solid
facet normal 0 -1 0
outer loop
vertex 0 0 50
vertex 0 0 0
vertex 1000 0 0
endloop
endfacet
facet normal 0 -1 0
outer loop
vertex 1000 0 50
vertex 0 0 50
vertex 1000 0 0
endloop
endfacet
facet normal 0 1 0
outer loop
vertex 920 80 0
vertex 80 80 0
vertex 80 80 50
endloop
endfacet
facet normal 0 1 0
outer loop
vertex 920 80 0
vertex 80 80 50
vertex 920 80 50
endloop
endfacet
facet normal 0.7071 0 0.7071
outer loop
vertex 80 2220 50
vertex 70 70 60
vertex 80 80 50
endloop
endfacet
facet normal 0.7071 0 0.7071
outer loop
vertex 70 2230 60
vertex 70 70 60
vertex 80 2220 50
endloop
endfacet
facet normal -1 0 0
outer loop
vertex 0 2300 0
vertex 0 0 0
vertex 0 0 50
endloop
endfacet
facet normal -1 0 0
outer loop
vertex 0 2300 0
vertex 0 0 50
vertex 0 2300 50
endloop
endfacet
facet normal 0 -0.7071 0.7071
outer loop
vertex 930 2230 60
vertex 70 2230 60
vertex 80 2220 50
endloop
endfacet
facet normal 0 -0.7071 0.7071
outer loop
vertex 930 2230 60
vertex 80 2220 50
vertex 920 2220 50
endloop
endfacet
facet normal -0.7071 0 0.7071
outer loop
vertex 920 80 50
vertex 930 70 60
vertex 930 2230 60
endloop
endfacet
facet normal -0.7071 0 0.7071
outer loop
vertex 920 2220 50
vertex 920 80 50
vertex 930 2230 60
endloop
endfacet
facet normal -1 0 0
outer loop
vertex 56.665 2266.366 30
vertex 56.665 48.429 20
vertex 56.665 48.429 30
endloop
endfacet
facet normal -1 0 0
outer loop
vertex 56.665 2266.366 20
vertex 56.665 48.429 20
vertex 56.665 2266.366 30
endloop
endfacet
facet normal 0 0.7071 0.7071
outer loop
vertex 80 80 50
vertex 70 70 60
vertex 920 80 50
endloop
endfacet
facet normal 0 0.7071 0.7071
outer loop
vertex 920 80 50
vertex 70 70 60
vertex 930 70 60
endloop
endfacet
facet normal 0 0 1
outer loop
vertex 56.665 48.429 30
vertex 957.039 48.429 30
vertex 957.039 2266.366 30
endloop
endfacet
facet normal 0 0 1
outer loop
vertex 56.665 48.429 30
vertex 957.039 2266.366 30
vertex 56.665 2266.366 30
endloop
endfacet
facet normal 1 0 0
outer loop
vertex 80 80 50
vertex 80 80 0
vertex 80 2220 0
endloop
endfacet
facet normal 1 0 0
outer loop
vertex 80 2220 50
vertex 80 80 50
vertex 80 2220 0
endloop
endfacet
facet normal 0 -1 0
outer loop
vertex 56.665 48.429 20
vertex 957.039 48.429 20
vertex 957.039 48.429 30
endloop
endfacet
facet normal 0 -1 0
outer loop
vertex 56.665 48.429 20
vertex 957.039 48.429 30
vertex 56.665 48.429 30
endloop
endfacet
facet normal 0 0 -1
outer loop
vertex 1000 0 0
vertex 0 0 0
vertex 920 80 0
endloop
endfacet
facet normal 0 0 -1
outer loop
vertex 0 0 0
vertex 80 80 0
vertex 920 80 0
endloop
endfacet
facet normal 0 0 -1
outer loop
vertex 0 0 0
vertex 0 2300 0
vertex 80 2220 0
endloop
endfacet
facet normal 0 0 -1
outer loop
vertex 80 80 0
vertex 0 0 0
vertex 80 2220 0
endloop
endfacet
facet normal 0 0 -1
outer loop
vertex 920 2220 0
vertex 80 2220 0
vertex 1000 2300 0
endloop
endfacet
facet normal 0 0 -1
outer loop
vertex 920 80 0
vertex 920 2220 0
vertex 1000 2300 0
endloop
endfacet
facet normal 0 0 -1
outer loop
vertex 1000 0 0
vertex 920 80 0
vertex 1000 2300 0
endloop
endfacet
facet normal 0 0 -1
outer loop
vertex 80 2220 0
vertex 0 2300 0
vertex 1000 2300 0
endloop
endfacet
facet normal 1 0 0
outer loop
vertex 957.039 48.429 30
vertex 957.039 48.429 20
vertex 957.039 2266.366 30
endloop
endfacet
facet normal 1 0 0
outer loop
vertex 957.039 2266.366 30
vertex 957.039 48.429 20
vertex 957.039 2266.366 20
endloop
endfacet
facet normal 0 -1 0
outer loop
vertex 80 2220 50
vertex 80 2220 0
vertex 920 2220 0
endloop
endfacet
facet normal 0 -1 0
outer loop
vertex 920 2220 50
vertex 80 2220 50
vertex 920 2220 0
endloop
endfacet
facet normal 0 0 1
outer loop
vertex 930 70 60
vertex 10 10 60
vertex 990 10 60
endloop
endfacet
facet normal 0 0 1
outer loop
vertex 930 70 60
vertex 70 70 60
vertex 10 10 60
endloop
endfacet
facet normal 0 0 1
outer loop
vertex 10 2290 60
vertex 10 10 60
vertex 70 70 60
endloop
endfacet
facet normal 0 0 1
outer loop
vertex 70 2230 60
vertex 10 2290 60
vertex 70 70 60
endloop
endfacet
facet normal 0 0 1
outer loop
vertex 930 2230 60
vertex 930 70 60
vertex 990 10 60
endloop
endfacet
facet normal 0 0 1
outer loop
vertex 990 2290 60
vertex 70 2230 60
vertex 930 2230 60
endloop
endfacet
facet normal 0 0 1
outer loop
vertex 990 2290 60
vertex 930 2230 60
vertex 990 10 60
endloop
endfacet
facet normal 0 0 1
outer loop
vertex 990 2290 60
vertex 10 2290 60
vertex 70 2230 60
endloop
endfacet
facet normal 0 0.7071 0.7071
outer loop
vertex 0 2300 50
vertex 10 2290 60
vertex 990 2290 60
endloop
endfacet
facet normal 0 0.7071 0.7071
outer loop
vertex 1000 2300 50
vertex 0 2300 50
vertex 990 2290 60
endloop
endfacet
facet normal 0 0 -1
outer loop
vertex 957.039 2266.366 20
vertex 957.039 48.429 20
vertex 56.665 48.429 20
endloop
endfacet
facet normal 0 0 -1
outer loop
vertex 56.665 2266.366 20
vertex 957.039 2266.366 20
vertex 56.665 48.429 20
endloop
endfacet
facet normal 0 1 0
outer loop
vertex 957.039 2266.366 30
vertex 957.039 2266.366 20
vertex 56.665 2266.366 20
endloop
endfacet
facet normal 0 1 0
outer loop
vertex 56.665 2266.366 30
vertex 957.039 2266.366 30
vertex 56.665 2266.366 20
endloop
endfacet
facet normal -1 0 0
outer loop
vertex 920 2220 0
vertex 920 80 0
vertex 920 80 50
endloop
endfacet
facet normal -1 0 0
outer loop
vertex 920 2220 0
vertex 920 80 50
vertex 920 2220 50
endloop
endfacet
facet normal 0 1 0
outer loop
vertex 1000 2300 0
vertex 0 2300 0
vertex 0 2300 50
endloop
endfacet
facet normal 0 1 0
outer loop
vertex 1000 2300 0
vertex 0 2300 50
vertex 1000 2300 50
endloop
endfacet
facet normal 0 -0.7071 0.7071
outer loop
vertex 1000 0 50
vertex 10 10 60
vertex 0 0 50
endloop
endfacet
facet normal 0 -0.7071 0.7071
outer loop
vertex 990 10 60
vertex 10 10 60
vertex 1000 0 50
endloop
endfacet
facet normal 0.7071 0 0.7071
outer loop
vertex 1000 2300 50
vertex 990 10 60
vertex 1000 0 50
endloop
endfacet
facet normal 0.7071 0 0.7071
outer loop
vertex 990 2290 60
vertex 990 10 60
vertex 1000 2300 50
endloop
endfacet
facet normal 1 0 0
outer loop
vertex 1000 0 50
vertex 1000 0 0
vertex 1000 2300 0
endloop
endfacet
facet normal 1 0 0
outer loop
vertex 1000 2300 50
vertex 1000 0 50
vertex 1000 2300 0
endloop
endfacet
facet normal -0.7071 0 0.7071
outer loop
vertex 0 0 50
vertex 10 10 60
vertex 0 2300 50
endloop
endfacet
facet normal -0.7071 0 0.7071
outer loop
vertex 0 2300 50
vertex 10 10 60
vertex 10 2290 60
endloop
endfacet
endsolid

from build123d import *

# Parameters (mm, degrees)
SKETCH_1_W      = 1000
SKETCH_1_H      = 2300
SKETCH_1_W_2    = 840
SKETCH_1_H_2    = 2140
EXTRUDE_1_DEPTH = 60
CHAMFER_1_SIZE  = 10
EXTRUDE_START   = -20
SKETCH_2_W      = 900.373669922
SKETCH_2_H      = 2217.936834282
EXTRUDE_2_DEPTH = 10


with BuildPart() as part:
    # Эскиз1 → Бобышка-Вытянуть1 (new body)
    with BuildSketch(Plane.XY):
        with Locations((500, 1150)):
            Rectangle(SKETCH_1_W, SKETCH_1_H)
        with Locations((500, 1150)):
            Rectangle(SKETCH_1_W_2, SKETCH_1_H_2, mode=Mode.SUBTRACT)
    extrude(amount=EXTRUDE_1_DEPTH)

    # Фаска1
    chamfer_1_edges = [part.edges().sort_by_distance(p)[0] for p in [
        (1000, 1150, 60),
        (500, 80, 60),
        (500, 2300, 60),
        (920, 1150, 60),
        (500, 2220, 60),
        (80, 1150, 60),
        (0, 1150, 60),
        (500, 0, 60),
    ]]
    chamfer(chamfer_1_edges, length=CHAMFER_1_SIZE)


with BuildPart() as body_2:
    # Эскиз2 → Бобышка-Вытянуть2 (new body)
    with BuildSketch(Plane(origin=(0, 0, 0), x_dir=(-1, 0, 0), z_dir=(0, 0, -1)).offset(EXTRUDE_START)):
        with Locations((-506.85184074, 1157.397135367)):
            Rectangle(SKETCH_2_W, SKETCH_2_H)
    extrude(amount=-EXTRUDE_2_DEPTH)


solid = Compound([part.part, body_2.part])
